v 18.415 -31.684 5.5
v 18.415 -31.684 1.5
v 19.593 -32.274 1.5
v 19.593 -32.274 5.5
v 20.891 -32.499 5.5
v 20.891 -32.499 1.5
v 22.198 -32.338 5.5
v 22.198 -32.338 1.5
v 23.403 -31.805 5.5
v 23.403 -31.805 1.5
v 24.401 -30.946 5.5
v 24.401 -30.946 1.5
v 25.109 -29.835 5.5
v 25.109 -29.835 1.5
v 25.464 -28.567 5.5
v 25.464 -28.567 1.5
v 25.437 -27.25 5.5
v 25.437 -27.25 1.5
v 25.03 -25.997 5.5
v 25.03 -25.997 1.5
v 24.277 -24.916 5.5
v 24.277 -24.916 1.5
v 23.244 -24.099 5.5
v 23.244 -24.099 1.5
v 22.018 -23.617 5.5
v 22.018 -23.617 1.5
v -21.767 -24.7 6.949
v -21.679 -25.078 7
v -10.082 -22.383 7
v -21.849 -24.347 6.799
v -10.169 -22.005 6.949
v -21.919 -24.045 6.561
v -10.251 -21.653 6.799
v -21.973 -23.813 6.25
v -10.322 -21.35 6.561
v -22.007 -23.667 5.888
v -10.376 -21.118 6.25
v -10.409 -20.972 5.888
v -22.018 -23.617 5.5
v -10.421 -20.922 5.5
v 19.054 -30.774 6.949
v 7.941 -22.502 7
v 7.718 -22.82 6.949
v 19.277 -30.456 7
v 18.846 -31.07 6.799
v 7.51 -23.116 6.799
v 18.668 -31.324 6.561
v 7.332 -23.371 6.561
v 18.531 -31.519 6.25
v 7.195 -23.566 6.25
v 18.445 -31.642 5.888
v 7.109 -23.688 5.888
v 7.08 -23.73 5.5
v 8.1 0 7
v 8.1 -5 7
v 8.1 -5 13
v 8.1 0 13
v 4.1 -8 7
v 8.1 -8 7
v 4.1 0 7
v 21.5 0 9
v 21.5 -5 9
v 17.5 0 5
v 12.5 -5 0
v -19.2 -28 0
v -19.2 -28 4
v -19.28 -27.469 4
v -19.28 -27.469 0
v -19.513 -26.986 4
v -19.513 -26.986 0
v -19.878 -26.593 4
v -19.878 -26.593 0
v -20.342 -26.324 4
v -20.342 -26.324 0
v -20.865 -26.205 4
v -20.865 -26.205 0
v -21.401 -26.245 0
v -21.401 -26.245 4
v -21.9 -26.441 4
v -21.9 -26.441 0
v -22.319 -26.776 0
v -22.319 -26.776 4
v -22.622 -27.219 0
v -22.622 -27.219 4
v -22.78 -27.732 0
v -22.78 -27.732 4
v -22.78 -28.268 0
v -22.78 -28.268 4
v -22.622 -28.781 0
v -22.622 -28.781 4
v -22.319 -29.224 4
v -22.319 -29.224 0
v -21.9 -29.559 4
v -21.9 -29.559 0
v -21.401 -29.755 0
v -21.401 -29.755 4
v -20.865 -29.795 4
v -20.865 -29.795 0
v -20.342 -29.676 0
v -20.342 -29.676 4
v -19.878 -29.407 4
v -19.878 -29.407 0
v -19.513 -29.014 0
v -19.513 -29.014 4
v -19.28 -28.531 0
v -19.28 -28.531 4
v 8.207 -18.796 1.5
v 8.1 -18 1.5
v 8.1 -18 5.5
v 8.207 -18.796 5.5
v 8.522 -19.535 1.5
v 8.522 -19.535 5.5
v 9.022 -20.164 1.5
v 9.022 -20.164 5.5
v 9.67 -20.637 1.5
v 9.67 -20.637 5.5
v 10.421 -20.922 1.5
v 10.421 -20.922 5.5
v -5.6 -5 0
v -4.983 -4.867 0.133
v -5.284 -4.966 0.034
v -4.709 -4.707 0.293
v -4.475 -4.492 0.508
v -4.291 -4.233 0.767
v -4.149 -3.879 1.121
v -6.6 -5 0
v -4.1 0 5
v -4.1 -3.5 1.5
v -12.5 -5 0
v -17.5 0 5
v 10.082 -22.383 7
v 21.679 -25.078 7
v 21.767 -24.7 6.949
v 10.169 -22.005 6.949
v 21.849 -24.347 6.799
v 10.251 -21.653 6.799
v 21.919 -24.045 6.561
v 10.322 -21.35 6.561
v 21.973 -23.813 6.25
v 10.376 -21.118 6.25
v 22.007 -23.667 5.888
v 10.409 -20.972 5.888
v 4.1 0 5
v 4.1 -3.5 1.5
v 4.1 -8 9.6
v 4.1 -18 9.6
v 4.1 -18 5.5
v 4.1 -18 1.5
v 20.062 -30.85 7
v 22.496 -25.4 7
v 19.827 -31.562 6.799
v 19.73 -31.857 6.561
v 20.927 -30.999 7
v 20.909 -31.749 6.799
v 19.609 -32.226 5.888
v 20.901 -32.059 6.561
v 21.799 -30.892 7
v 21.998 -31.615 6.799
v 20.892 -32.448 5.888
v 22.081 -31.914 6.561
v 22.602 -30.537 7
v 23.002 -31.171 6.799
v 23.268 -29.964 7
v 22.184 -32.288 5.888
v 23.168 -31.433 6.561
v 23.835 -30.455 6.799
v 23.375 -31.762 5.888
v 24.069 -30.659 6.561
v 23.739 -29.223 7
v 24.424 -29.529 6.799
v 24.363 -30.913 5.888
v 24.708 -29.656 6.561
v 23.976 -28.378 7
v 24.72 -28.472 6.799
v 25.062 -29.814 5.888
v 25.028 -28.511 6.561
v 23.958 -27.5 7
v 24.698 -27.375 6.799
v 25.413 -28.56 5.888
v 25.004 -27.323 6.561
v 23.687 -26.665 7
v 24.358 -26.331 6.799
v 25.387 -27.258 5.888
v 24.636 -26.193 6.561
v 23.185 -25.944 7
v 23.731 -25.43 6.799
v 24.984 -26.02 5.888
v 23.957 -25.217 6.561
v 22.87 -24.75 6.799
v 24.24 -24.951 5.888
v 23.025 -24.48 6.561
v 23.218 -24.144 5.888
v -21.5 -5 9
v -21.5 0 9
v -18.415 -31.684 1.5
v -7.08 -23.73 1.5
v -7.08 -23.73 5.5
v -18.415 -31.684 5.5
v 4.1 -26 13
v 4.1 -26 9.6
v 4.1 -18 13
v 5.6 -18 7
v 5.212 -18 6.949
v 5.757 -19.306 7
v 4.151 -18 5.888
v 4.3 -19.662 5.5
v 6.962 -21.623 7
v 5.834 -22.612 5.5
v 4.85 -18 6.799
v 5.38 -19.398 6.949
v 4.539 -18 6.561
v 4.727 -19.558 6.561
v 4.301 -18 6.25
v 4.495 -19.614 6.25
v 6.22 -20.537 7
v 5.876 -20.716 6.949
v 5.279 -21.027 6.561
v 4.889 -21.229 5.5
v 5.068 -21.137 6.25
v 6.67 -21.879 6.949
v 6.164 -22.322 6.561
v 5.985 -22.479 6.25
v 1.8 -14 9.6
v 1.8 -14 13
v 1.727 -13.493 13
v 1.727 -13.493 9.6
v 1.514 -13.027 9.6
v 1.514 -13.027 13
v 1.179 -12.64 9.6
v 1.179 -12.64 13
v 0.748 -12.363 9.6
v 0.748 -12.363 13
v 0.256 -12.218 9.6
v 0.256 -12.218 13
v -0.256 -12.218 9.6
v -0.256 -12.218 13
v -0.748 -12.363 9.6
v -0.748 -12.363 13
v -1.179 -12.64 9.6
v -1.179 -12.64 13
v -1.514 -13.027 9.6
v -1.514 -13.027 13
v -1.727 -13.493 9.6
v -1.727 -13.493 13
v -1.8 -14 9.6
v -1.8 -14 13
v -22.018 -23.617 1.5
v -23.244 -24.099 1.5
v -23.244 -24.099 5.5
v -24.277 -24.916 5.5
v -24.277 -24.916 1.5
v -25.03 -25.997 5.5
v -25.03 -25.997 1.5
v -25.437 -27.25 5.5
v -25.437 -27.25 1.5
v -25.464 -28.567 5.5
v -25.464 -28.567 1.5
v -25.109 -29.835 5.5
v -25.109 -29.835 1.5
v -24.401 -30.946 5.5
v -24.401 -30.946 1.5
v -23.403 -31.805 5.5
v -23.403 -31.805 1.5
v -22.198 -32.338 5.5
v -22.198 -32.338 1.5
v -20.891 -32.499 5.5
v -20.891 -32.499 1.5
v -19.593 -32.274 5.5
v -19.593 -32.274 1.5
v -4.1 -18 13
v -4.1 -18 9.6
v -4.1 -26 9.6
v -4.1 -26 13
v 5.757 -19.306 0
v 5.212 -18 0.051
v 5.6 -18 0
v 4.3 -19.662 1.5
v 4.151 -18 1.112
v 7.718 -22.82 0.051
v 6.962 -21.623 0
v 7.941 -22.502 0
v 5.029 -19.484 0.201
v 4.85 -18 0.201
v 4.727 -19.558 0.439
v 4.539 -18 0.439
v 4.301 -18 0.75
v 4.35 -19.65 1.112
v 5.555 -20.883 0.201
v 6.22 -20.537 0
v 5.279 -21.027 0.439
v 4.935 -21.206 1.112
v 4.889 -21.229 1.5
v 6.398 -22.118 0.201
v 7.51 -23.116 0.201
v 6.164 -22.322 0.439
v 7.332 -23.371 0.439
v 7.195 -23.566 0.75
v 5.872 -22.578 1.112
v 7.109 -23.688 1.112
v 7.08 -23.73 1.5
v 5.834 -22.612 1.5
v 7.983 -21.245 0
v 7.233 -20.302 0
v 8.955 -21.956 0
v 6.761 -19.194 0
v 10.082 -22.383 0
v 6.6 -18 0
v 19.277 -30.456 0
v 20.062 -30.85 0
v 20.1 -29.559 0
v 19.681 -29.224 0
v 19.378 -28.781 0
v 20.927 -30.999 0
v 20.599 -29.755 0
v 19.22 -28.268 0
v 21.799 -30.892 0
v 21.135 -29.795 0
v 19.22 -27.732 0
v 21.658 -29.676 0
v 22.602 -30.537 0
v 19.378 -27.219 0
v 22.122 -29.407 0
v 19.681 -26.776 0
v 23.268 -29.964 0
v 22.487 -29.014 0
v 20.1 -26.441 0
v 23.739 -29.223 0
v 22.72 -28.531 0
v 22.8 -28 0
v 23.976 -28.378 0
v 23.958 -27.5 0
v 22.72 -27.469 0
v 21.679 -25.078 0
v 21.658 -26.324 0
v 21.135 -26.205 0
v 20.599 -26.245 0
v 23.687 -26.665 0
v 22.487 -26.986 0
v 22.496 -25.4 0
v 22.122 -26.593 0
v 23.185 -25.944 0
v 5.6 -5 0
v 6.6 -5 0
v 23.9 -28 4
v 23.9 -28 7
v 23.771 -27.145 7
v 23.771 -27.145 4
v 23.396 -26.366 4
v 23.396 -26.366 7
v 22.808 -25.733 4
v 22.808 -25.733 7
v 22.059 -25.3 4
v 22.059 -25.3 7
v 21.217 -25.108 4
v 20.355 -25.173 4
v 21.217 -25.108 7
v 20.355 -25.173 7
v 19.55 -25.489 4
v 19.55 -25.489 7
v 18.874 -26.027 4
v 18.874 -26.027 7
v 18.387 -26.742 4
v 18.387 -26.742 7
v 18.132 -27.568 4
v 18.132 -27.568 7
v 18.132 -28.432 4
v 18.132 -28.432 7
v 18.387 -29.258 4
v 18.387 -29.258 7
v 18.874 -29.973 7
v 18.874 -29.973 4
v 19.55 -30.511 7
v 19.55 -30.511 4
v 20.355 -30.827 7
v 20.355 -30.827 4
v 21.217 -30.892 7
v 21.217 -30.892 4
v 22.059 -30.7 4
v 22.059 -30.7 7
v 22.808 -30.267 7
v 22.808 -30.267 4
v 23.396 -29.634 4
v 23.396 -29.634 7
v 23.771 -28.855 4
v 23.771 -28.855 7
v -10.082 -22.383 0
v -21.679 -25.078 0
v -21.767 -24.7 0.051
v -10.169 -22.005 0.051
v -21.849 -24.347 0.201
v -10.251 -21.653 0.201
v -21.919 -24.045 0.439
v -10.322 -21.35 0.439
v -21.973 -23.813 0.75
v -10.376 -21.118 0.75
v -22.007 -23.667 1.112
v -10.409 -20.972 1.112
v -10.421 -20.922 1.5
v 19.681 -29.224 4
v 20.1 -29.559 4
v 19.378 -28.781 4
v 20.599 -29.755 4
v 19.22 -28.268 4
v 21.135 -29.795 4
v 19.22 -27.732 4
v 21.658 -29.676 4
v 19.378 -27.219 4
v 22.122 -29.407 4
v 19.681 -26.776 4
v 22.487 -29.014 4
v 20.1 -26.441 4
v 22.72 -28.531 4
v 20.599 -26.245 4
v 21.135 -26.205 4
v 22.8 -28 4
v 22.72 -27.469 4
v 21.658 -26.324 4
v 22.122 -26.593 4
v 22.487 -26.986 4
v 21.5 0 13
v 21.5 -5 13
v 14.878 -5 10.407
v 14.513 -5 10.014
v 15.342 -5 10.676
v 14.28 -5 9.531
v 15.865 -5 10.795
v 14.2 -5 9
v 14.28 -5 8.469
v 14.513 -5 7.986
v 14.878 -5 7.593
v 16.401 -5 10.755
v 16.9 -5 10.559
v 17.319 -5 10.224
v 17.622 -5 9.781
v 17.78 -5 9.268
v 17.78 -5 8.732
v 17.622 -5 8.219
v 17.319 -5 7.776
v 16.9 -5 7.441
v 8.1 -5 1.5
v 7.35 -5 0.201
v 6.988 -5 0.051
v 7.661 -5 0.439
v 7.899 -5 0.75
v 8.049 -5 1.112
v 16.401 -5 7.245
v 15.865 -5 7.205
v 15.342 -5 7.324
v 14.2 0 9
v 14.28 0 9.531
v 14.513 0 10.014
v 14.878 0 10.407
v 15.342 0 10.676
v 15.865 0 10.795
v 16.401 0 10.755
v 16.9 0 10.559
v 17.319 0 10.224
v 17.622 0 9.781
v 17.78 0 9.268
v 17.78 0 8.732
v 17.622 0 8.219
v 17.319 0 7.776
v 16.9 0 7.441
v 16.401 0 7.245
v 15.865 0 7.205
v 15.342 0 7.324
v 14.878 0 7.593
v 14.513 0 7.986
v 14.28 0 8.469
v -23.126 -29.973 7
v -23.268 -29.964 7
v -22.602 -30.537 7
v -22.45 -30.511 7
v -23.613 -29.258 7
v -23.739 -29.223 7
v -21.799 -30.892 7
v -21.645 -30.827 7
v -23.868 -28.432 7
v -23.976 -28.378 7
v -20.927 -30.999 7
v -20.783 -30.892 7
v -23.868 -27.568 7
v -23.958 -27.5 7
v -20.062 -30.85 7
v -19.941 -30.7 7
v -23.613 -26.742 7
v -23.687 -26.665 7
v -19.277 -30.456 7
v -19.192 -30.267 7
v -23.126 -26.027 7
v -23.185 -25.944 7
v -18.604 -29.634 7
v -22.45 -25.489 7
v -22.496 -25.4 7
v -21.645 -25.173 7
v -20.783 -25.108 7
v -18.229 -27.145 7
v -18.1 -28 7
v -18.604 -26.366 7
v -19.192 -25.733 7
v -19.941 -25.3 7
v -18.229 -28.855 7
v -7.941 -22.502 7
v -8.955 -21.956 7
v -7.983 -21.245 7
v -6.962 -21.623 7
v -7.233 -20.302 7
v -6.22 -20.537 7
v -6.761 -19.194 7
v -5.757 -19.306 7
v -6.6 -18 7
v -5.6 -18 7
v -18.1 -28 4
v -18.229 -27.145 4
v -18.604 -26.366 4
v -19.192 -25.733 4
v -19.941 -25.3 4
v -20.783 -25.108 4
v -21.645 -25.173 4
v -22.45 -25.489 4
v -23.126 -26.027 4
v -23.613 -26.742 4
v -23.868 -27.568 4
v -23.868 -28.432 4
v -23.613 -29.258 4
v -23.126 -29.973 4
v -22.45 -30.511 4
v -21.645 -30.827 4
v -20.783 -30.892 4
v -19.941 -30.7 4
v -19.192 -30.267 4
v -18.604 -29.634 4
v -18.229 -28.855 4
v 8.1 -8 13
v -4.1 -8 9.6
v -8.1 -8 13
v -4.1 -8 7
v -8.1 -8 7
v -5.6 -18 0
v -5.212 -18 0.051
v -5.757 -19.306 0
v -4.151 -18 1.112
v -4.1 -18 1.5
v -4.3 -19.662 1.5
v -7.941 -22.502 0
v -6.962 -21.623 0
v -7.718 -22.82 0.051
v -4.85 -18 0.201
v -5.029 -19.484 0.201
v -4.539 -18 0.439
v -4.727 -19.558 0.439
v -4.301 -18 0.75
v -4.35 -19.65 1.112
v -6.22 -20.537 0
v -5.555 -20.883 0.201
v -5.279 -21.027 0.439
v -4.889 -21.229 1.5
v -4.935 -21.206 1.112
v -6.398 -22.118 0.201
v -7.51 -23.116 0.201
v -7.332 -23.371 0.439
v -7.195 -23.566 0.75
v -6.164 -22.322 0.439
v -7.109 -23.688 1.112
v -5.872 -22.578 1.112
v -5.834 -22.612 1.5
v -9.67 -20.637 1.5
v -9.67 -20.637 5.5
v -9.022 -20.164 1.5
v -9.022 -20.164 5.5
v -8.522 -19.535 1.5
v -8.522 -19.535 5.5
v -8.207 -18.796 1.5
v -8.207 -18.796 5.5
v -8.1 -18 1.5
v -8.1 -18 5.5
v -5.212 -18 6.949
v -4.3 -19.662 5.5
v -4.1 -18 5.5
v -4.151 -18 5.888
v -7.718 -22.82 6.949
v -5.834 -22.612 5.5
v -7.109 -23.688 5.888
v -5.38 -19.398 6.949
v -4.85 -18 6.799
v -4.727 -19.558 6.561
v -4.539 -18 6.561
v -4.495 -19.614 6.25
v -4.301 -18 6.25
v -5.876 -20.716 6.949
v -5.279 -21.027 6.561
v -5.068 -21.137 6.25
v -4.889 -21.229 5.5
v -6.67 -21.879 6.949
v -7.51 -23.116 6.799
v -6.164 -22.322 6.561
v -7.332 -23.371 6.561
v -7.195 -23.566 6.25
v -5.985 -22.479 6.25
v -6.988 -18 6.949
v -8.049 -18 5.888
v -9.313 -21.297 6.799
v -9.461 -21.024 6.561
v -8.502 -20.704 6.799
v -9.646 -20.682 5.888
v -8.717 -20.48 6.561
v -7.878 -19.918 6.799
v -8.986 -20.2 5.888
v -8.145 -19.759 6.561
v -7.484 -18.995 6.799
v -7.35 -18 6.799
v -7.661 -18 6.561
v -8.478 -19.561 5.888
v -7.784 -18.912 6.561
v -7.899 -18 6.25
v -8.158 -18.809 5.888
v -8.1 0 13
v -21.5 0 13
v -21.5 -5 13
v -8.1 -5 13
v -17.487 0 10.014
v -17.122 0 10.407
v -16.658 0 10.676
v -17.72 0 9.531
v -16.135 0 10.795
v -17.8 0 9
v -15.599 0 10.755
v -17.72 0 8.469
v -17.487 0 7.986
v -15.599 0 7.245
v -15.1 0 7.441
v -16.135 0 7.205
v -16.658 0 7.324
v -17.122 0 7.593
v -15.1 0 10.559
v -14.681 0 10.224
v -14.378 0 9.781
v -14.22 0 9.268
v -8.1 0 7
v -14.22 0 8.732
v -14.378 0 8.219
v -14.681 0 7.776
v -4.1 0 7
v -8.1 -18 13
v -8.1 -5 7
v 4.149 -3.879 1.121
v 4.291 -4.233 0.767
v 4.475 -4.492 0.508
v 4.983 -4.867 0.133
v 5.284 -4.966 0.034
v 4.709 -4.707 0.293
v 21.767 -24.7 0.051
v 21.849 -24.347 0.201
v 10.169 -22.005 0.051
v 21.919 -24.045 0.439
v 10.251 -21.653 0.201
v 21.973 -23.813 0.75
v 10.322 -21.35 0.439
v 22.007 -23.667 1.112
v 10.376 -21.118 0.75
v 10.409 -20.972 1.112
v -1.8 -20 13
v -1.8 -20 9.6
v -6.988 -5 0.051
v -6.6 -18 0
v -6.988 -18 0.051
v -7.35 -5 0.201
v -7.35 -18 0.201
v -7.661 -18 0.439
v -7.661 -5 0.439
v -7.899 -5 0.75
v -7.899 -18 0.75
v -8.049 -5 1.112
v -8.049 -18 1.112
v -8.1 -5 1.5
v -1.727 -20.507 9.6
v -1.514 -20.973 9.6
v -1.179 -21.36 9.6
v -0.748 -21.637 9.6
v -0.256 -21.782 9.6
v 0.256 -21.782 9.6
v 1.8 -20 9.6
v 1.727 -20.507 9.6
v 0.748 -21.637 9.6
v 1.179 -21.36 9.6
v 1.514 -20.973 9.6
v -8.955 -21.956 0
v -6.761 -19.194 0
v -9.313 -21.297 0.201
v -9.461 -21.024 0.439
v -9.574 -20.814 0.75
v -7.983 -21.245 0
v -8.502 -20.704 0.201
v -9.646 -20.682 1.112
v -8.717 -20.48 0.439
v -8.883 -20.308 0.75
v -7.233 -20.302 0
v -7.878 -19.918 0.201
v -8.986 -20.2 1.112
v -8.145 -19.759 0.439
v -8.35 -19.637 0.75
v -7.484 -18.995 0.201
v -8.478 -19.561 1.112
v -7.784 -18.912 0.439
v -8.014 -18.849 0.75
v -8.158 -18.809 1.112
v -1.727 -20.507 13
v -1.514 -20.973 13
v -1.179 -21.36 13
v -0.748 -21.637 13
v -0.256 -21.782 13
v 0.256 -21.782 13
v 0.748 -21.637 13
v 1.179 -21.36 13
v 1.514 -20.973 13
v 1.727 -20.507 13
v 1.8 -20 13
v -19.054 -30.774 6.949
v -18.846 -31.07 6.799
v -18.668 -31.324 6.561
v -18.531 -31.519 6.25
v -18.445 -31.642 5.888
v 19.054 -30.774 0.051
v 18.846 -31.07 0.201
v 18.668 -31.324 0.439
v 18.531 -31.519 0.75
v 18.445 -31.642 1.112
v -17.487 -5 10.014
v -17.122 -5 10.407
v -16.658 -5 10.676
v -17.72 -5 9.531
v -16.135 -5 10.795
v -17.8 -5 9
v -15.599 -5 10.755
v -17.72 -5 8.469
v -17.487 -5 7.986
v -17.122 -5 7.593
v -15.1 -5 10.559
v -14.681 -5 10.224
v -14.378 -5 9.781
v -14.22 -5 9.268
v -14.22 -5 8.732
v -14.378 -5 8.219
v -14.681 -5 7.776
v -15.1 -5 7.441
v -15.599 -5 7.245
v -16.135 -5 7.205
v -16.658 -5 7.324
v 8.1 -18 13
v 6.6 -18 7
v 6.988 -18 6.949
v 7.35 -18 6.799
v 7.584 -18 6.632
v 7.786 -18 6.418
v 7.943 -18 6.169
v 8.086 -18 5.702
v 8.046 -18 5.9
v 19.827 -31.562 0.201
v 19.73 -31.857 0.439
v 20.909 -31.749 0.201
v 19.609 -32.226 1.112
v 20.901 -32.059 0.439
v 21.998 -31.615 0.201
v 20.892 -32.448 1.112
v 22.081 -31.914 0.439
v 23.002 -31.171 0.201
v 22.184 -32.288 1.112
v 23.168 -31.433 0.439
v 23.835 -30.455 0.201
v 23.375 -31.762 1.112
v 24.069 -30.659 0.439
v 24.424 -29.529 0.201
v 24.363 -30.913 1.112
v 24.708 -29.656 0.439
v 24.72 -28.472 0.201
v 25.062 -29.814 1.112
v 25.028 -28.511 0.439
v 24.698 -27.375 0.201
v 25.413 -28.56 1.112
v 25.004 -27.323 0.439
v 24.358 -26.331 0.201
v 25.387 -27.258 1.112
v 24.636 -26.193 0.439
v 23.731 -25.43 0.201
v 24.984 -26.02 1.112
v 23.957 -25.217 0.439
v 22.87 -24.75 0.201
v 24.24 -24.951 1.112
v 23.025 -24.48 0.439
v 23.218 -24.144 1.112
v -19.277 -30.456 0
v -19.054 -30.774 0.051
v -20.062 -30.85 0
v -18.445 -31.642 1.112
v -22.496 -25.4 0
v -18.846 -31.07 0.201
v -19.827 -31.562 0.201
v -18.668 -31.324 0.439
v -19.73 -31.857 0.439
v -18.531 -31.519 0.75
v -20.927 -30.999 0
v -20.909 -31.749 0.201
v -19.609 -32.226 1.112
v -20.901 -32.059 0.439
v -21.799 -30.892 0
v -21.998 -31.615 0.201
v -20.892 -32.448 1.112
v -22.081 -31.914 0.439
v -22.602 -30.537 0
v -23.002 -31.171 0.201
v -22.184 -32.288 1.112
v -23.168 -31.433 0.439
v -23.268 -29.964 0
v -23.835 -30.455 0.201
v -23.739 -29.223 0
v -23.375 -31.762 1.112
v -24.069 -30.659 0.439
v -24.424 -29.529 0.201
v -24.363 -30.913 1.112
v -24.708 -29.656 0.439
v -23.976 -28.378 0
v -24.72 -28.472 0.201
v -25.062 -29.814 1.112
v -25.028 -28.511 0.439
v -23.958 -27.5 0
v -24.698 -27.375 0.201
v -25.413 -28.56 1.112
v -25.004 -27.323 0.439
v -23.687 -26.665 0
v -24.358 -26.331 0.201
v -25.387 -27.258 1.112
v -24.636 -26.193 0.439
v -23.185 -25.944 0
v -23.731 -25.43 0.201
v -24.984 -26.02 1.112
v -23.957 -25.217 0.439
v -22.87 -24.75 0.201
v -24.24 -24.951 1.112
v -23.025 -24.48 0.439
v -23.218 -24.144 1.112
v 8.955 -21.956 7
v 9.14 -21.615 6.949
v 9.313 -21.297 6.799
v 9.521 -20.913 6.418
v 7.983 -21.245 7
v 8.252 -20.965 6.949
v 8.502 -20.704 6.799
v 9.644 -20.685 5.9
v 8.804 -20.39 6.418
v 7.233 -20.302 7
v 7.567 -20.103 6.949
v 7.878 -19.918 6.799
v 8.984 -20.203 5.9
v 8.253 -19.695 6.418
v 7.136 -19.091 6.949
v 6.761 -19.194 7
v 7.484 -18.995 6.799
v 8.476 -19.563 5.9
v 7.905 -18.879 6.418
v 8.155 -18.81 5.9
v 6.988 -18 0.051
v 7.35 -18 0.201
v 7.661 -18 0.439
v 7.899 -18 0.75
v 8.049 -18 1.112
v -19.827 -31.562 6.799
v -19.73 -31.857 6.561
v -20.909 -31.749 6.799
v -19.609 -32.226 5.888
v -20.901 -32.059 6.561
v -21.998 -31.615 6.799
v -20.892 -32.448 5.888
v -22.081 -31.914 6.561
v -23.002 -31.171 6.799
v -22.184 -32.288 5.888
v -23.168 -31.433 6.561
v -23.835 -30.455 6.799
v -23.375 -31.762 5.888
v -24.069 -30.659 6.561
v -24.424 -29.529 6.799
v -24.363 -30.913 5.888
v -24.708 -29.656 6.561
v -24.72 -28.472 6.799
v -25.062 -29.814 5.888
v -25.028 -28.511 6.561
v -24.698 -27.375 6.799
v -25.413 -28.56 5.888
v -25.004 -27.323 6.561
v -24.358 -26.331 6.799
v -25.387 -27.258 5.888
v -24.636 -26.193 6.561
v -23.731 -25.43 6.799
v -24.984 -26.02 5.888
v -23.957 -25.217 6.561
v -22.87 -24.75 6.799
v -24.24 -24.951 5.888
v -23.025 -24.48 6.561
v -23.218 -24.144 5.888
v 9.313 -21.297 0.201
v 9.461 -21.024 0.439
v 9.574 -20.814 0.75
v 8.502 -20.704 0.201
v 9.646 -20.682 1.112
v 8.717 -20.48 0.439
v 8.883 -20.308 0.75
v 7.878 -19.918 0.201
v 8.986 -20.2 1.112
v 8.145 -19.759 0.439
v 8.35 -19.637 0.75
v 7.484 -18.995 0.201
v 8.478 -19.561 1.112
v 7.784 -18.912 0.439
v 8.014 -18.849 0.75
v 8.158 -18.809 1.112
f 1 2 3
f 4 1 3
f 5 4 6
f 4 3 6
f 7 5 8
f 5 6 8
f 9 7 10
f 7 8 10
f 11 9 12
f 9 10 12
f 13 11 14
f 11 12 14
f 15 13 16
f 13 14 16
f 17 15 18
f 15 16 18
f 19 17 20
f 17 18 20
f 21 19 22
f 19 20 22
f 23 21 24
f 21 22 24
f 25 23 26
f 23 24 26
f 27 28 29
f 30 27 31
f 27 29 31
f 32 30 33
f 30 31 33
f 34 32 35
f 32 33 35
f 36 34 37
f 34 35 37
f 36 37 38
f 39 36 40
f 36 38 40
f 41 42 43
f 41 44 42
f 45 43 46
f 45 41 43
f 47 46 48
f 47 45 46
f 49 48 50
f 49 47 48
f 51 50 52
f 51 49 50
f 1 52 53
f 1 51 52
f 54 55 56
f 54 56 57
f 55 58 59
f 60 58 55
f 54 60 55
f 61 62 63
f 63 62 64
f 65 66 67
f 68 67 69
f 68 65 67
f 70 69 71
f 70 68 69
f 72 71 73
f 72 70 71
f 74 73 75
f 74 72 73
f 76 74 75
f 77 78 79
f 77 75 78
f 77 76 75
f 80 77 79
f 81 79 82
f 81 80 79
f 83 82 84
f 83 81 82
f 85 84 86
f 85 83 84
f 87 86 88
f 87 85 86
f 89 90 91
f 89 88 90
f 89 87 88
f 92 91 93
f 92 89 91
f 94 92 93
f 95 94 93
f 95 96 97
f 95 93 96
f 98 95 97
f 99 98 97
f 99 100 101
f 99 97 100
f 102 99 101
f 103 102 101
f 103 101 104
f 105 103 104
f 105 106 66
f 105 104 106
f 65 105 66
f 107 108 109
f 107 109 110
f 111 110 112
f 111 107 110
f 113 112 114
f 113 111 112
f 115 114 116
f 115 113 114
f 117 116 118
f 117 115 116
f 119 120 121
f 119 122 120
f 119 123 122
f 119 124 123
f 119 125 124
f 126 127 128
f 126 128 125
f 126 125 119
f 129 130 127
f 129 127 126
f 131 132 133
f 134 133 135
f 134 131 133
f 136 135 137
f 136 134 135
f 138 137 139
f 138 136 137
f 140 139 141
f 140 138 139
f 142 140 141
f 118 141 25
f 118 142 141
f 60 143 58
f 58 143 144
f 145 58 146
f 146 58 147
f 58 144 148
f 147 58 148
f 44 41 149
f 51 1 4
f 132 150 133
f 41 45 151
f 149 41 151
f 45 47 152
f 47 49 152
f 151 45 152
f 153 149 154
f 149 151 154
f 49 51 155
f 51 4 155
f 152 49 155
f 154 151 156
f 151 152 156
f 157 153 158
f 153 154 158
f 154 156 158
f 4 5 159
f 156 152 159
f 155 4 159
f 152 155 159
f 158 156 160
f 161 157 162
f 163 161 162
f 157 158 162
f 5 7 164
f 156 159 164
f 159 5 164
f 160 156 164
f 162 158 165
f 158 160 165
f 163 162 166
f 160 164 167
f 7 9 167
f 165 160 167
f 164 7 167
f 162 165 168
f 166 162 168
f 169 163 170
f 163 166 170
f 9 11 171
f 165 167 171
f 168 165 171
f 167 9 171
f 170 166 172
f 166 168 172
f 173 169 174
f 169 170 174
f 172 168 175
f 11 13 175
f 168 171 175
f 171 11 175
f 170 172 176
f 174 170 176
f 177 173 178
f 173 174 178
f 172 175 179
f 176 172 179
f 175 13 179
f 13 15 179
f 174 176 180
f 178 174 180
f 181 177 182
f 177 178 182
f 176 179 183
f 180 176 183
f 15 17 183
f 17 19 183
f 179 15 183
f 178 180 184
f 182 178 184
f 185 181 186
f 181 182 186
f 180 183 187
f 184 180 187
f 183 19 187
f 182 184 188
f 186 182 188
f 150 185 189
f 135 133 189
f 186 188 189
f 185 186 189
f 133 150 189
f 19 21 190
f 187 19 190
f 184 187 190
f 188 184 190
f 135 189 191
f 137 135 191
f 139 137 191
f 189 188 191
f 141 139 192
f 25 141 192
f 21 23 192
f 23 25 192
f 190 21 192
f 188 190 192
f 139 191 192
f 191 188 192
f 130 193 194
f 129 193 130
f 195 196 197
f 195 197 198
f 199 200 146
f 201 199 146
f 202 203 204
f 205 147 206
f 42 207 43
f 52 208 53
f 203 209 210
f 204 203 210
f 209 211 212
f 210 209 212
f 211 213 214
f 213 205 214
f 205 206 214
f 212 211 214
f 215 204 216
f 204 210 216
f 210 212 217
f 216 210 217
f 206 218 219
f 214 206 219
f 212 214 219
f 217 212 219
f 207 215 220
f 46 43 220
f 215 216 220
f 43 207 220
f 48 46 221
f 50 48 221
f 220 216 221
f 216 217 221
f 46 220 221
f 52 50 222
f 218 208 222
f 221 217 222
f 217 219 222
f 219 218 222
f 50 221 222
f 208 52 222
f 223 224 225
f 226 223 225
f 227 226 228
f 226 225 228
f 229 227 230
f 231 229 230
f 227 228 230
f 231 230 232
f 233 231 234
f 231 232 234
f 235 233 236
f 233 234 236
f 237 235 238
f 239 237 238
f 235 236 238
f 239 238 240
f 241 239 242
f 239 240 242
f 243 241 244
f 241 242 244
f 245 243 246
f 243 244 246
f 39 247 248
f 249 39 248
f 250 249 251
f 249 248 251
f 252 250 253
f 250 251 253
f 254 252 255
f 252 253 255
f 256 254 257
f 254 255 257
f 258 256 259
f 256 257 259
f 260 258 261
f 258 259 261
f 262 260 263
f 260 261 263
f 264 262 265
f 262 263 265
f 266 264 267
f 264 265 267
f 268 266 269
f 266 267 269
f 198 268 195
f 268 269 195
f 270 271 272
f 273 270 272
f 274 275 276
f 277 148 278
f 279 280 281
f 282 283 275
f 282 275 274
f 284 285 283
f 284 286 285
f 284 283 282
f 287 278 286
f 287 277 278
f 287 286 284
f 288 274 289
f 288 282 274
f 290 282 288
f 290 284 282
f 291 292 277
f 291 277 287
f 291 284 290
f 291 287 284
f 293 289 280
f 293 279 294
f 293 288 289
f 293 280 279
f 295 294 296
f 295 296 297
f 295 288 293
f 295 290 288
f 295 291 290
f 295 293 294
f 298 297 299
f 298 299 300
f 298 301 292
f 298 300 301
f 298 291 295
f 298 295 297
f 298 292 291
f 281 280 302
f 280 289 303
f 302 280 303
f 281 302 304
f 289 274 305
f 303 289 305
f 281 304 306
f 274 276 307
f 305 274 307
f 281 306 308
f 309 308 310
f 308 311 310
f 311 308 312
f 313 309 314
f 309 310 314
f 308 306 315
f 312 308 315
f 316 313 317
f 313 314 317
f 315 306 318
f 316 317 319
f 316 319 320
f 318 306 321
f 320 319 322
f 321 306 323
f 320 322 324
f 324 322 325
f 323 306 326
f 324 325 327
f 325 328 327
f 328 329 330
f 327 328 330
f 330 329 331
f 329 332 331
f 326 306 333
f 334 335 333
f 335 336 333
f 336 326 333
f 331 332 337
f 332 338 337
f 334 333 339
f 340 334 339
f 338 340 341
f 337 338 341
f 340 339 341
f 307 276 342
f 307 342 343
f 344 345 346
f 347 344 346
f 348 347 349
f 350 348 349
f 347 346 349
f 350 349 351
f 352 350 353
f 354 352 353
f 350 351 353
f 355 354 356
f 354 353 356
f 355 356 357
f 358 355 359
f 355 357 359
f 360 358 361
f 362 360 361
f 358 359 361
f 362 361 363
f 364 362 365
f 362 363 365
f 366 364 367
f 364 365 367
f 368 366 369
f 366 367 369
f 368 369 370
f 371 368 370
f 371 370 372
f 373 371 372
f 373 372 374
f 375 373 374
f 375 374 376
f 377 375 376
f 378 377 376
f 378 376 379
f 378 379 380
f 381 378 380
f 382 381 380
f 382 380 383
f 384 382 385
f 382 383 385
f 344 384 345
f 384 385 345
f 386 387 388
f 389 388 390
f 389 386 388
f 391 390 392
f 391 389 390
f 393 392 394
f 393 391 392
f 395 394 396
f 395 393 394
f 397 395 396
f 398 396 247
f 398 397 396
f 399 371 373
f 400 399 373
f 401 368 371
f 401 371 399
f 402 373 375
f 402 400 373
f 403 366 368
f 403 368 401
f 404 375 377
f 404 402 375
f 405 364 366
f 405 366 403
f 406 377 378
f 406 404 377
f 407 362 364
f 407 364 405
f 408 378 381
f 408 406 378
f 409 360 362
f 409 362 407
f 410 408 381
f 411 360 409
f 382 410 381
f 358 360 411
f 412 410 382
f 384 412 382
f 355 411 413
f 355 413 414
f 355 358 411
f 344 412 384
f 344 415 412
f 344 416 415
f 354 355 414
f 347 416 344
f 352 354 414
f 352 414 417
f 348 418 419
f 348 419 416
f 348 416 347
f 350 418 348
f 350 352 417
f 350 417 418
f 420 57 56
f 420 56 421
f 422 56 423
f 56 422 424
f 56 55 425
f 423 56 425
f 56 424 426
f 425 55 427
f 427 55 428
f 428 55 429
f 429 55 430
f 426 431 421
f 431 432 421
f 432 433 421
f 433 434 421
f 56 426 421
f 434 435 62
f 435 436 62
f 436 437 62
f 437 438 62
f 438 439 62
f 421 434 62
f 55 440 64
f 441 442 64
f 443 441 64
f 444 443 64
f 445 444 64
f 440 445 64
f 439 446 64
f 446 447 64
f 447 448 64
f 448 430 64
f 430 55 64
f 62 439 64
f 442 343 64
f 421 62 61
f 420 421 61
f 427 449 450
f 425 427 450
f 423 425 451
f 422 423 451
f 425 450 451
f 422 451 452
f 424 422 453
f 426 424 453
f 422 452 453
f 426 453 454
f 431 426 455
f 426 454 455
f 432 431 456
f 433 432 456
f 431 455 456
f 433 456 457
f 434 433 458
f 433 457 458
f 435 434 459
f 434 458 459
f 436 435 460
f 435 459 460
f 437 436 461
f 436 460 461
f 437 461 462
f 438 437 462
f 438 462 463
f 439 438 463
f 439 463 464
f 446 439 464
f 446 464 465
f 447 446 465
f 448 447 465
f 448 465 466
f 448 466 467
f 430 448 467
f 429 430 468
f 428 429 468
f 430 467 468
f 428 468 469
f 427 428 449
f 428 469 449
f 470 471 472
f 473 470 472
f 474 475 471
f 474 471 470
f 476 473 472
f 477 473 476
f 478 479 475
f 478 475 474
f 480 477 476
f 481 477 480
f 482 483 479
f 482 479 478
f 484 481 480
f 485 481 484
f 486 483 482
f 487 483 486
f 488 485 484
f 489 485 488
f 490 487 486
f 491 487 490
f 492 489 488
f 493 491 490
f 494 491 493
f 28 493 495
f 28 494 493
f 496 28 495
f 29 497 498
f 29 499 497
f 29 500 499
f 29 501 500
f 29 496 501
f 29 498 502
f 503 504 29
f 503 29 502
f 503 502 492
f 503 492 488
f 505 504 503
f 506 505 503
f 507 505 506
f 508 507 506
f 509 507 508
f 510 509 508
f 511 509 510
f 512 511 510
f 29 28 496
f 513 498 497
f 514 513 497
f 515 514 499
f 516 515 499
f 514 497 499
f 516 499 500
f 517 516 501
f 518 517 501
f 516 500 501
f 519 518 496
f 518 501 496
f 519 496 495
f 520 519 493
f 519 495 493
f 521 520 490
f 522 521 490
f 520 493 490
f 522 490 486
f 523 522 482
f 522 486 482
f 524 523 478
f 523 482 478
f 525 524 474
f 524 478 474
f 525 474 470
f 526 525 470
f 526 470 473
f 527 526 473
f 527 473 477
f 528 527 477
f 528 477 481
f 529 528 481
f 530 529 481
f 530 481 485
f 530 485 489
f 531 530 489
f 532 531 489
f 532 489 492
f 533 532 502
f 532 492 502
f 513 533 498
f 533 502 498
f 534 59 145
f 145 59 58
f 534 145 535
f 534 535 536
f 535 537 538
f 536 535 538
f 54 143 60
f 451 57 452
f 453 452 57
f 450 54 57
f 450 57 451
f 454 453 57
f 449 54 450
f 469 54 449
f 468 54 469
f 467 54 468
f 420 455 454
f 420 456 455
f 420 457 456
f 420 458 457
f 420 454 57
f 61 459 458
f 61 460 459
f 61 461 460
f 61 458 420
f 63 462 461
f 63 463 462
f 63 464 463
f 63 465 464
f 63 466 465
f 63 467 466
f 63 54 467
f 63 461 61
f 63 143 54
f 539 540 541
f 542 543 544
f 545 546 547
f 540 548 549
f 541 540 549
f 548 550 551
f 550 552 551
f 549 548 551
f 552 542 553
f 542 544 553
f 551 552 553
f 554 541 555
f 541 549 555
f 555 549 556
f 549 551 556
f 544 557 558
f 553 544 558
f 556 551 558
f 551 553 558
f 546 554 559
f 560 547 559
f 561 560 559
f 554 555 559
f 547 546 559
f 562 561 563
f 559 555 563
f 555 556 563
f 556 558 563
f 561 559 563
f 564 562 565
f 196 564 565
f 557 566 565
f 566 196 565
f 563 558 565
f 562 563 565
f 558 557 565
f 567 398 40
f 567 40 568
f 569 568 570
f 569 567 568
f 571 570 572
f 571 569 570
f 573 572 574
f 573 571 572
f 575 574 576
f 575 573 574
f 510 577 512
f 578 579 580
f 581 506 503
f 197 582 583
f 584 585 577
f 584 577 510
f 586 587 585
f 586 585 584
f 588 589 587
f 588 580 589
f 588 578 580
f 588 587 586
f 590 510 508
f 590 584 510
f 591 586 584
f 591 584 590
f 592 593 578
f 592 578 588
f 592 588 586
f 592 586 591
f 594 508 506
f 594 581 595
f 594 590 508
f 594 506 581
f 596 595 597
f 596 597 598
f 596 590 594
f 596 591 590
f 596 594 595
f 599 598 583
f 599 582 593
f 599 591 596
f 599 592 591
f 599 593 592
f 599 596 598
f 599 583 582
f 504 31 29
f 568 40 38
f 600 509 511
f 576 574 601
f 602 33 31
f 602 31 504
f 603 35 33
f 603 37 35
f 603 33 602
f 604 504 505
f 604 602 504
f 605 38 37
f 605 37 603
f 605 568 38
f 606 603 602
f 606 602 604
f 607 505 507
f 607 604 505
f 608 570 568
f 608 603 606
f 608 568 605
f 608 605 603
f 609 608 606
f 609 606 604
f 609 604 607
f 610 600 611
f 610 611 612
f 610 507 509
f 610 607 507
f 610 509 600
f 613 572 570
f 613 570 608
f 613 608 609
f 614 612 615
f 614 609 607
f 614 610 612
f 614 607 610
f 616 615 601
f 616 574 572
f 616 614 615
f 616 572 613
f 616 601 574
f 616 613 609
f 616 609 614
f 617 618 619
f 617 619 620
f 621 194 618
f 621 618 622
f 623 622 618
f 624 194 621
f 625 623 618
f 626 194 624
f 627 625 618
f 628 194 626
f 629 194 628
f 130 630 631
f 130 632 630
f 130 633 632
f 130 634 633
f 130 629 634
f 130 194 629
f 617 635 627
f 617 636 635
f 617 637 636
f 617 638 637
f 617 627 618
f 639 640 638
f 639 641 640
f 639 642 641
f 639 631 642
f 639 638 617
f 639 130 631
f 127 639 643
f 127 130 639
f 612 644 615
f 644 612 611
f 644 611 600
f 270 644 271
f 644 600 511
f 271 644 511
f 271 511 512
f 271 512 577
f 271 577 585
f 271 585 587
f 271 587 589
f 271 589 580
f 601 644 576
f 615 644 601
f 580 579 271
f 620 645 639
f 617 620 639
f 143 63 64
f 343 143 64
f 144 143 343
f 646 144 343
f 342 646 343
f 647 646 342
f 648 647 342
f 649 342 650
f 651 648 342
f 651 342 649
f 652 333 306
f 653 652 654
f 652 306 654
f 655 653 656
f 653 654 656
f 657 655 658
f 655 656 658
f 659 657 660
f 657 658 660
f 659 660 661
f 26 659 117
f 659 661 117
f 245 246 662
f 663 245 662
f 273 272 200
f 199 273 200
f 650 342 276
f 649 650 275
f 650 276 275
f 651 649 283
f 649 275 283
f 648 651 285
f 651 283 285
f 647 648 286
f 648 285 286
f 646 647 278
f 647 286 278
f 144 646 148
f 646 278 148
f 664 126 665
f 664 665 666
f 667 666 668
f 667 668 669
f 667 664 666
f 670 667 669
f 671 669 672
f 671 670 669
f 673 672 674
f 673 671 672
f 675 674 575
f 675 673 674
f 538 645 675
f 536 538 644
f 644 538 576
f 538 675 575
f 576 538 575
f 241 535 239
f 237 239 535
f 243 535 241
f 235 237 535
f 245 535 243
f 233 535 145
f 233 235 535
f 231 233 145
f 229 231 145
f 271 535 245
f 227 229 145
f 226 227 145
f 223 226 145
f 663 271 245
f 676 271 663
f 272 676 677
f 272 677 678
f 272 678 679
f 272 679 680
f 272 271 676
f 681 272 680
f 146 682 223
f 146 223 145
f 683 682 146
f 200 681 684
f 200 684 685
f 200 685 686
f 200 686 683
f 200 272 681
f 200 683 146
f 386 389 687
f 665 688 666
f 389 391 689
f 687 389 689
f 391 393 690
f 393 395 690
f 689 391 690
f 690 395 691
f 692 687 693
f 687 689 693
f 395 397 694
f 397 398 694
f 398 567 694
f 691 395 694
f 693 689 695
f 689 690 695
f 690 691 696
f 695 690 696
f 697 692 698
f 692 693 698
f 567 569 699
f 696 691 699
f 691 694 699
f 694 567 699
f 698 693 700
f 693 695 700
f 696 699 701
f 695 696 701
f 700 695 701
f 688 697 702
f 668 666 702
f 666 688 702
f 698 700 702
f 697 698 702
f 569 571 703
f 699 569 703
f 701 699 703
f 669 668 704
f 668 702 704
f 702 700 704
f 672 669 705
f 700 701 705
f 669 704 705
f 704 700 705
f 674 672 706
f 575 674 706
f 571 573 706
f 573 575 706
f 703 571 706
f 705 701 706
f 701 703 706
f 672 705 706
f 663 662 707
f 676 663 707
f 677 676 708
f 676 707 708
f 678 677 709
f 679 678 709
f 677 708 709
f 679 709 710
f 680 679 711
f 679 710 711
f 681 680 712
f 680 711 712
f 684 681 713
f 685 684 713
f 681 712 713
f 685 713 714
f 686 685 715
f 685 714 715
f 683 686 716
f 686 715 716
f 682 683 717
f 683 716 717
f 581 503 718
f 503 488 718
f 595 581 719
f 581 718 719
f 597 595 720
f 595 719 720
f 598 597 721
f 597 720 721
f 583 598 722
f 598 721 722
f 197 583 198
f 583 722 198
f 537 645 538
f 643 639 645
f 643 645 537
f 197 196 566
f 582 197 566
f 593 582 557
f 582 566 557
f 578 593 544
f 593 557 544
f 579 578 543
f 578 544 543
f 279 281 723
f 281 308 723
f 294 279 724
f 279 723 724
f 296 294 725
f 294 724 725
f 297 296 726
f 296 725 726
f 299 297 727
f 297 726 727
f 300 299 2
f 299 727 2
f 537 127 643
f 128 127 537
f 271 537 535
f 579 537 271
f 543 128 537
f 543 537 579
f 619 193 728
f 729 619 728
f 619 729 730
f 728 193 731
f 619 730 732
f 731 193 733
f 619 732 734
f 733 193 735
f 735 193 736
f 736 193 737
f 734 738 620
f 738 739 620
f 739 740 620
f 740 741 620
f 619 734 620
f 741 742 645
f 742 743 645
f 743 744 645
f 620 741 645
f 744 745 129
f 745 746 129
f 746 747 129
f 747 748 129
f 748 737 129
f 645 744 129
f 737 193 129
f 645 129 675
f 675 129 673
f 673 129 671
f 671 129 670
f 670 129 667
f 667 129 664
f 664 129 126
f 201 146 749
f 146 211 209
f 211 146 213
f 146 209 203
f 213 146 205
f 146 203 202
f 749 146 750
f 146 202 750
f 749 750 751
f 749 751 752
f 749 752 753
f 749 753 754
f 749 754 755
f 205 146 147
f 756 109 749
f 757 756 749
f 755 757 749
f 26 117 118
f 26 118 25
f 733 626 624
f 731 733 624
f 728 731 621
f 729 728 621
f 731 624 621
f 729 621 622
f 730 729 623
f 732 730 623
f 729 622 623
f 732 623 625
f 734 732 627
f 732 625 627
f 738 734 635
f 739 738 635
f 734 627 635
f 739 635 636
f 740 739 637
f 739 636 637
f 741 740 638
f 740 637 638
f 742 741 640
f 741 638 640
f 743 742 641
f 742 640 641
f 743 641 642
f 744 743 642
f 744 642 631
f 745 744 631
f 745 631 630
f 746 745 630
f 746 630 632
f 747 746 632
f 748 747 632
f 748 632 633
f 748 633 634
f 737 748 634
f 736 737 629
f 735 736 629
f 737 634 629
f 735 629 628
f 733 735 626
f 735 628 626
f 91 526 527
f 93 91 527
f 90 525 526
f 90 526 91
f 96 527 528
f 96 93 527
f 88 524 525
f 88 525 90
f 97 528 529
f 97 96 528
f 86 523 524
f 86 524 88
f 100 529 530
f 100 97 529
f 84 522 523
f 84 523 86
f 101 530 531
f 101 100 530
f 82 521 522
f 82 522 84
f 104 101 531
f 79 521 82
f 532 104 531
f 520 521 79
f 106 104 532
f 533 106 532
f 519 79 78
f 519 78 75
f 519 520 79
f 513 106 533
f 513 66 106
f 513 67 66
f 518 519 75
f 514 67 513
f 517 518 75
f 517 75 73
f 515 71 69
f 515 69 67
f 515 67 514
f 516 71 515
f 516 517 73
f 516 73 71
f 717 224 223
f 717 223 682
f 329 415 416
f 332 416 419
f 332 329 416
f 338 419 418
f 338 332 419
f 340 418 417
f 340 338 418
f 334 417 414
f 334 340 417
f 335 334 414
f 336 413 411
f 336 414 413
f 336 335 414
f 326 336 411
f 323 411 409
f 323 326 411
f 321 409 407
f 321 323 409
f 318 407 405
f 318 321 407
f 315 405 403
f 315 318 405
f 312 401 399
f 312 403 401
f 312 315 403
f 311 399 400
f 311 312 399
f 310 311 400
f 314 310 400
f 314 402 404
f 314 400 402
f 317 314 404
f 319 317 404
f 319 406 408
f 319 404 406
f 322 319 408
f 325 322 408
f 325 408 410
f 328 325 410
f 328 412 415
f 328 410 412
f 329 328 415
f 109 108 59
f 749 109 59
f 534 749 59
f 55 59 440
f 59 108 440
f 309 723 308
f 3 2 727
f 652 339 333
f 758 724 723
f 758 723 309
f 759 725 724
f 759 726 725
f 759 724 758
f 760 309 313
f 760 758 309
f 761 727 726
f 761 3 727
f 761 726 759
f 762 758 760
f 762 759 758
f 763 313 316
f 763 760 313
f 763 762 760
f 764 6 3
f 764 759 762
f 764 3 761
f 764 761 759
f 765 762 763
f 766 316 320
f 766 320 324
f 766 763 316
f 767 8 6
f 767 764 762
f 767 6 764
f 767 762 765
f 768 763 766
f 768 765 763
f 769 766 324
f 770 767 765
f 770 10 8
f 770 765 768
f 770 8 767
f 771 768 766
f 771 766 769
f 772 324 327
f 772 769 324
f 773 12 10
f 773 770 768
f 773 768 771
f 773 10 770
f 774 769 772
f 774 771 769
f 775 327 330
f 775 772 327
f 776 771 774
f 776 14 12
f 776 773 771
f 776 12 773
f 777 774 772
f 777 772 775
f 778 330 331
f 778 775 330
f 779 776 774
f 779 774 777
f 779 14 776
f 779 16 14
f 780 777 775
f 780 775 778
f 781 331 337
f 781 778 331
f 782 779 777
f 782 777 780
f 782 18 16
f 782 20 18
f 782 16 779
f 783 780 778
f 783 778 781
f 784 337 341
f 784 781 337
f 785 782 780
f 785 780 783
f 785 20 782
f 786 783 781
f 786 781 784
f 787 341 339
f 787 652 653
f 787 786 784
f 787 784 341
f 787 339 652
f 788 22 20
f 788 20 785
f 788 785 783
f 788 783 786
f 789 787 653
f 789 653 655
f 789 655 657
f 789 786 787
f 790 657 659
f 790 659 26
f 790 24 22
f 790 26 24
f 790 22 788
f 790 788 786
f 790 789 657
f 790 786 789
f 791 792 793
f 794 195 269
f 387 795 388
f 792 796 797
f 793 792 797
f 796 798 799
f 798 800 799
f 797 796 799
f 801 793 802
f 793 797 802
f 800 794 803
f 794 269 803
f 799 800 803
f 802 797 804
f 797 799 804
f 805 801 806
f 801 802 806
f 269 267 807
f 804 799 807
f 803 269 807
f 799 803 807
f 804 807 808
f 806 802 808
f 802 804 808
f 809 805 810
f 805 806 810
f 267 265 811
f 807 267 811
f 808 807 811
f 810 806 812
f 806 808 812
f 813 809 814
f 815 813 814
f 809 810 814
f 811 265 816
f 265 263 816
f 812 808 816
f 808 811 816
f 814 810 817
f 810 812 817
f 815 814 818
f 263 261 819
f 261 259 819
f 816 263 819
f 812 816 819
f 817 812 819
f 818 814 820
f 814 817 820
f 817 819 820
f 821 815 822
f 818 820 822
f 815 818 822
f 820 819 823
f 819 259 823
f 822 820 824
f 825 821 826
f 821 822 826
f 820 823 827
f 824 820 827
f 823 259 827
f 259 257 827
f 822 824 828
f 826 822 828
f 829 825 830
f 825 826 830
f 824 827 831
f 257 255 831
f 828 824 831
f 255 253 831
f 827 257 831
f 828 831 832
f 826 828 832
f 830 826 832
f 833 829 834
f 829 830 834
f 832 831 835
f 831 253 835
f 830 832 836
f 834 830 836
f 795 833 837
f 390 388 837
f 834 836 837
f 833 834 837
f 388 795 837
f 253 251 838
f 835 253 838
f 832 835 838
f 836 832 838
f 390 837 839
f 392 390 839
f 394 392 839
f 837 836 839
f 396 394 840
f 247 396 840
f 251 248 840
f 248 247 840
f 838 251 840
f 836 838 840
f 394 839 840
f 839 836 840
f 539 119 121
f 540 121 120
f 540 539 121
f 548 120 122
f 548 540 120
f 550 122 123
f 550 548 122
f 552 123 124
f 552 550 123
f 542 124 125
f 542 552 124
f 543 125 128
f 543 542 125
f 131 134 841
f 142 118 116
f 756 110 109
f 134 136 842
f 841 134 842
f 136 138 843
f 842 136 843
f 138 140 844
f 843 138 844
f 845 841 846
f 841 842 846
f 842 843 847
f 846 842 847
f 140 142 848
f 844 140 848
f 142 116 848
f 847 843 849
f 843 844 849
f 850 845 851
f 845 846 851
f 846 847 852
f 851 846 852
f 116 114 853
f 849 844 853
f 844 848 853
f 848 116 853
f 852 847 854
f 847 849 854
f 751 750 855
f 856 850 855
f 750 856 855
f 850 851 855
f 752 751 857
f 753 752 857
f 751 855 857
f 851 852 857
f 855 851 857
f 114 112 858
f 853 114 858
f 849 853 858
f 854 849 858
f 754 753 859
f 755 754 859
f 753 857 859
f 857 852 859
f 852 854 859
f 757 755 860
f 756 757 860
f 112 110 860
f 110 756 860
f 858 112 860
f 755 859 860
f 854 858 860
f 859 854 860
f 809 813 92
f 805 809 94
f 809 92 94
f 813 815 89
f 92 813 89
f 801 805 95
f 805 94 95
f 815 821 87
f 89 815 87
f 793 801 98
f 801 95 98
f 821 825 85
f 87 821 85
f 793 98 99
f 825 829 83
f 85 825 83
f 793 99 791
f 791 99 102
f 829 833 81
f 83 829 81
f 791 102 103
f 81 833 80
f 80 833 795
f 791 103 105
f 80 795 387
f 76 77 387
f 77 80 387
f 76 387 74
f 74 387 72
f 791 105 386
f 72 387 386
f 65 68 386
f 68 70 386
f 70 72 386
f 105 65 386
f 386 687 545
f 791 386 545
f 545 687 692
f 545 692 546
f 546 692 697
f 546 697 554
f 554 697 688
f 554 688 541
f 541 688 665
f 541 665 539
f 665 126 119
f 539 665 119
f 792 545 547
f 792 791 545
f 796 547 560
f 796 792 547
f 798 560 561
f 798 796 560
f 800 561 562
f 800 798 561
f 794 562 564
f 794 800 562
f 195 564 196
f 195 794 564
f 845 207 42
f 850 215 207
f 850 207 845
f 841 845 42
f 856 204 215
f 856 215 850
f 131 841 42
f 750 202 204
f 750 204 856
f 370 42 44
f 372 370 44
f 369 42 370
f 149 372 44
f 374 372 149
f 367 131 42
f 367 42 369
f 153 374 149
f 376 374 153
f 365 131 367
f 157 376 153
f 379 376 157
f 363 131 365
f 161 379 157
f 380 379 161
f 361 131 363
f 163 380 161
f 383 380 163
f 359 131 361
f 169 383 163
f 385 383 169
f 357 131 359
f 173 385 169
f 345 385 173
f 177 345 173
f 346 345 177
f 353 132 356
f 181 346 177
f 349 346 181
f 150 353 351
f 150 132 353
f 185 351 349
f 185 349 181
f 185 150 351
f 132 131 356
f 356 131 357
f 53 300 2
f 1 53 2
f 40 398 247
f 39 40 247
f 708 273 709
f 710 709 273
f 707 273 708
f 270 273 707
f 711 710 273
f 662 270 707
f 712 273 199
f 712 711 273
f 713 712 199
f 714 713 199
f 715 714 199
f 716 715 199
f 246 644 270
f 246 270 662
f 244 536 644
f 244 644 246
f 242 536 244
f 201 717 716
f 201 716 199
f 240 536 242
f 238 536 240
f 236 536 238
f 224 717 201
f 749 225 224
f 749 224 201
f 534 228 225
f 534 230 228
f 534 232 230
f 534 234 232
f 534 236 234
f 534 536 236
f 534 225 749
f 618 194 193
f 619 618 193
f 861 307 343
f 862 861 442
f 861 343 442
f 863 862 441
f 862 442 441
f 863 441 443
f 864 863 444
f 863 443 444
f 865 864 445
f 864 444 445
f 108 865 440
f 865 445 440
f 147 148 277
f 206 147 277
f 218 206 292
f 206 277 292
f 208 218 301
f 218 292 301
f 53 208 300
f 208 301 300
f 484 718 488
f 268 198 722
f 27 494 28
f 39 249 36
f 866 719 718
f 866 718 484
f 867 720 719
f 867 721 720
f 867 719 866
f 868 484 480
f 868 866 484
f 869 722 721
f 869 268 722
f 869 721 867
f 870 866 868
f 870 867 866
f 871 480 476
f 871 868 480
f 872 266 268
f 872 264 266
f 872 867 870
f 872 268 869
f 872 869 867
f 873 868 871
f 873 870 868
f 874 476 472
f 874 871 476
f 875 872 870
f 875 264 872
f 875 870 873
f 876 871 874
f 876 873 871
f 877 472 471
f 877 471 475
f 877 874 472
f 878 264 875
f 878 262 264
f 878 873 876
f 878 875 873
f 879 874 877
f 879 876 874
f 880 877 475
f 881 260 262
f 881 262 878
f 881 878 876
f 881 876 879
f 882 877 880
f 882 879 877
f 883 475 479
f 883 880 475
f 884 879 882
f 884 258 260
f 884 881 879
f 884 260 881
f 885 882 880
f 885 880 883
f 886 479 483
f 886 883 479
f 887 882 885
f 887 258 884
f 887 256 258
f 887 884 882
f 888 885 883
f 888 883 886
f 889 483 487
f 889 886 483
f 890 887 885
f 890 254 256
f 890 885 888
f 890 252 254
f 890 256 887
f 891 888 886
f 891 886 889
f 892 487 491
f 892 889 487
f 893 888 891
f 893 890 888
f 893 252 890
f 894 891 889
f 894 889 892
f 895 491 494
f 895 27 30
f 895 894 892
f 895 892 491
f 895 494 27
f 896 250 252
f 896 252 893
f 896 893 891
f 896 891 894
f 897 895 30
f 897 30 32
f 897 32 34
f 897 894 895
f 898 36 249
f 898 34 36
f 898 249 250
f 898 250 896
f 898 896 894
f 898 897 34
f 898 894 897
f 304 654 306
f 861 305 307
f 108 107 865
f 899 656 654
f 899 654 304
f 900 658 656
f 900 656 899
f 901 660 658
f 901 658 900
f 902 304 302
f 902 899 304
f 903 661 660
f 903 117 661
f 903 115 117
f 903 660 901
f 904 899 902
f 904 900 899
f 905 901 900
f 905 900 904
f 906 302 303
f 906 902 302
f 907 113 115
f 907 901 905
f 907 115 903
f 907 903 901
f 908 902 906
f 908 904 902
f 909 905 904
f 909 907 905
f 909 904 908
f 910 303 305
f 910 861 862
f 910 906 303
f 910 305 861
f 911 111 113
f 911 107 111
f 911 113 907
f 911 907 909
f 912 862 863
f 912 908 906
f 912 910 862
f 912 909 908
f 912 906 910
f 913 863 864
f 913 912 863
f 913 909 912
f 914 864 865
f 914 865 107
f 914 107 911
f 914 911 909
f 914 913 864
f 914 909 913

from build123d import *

# Parameters (mm, degrees)
SKETCH_R        = 1.8
PAD_DEPTH       = 7
SKETCH001_R     = 2.9
POCKET_DEPTH    = 3
SKETCH002_W     = 13.4
SKETCH002_H     = 5
PAD001_DEPTH    = 6
SKETCH005_R     = 1.8
POCKET002_DEPTH = 5
PAD002_DEPTH    = 6
SKETCH009_W     = 8.2
SKETCH009_H     = 18
POCKET006_DEPTH = 9.6
POCKET003_DEPTH = 47.001
POCKET004_DEPTH = 5
POCKET005_DEPTH = 13.001
FILLET_R        = 1.5


with BuildPart() as part:
    # Sketch → Pad (new body)
    with BuildSketch(Plane.XY):
        with BuildLine():
            Line((-21.5, 0), (-21.5, -5))
            Line((-21.5, -5), (-8.1, -5))
            Line((-8.1, -5), (-8.1, -18))
            ThreePointArc((-10.421049, -20.922161), (-8.750867, -19.865898), (-8.1, -18))
            Line((-10.421049, -20.922161), (-22.018426, -23.616758))
            ThreePointArc((-22.018426, -23.616758), (-25.108802, -29.835142), (-18.415416, -31.683738))
            Line((-7.079536, -23.730259), (-18.415416, -31.683738))
            ThreePointArc((-7.079536, -23.730259), (-4.889394, -21.2293), (-4.1, -18))
            Line((-4.1, -18), (-4.1, -26))
            Line((-4.1, -26), (4.1, -26))
            Line((4.1, -18), (4.1, -26))
            ThreePointArc((4.1, -18), (4.889394, -21.2293), (7.079536, -23.730259))
            Line((7.079536, -23.730259), (18.415416, -31.683738))
            ThreePointArc((18.415416, -31.683738), (25.108802, -29.835142), (22.018426, -23.616758))
            Line((10.421049, -20.922161), (22.018426, -23.616758))
            ThreePointArc((8.1, -18), (8.750867, -19.865898), (10.421049, -20.922161))
            Line((8.1, -5), (8.1, -18))
            Line((21.5, -5), (8.1, -5))
            Line((21.5, -5), (21.5, 0))
            Line((21.5, 0), (4.1, 0))
            Line((4.1, 0), (4.1, -8))
            Line((-4.1, -8), (4.1, -8))
            Line((-4.1, 0), (-4.1, -8))
            Line((-21.5, 0), (-4.1, 0))
        make_face()
        with Locations((-21, -28)):
            Circle(SKETCH_R, mode=Mode.SUBTRACT)
        with Locations((21, -28)):
            Circle(SKETCH_R, mode=Mode.SUBTRACT)
    extrude(amount=PAD_DEPTH)

    # Sketch001 (on Face28 of Pad) → Pocket (cut)
    with BuildSketch(Plane.XY.offset(7)):
        with Locations((-21, -28)):
            Circle(SKETCH001_R)
        with Locations((21, -28)):
            Circle(SKETCH001_R)
    extrude(amount=-POCKET_DEPTH, mode=Mode.SUBTRACT)

    # Sketch002 (on Face5 of Pocket) → Pad001 (join)
    with BuildSketch(Plane.XY.offset(7)):
        with Locations((14.8, -2.5)):
            Rectangle(SKETCH002_W, SKETCH002_H)
        with Locations((-14.8, -2.5)):
            Rectangle(SKETCH002_W, SKETCH002_H)
    extrude(amount=PAD001_DEPTH)

    # Sketch005 (on Face32 of Pad001) → Pocket002 (cut)
    with BuildSketch(Plane(origin=(0, 0, 0), x_dir=(-1, 0, 0), z_dir=(0, 1, 0))):
        with Locations((-16, 9)):
            Circle(SKETCH005_R)
        with Locations((16, 9)):
            Circle(SKETCH005_R)
    extrude(amount=-POCKET002_DEPTH, mode=Mode.SUBTRACT)

    # Sketch003 (on Face3 of Pad001) → Pad002 (join)
    with BuildSketch(Plane.XY.offset(7)):
        Polygon((-8.1, -8), (-8.1, -18), (-4.1, -18), (-4.1, -26), (4.1, -26), (4.1, -18), (8.1, -18), (8.1, -8), align=None)
    extrude(amount=PAD002_DEPTH)

    # Sketch009 (on Face1 of Pad002) → Pocket006 (cut)
    with BuildSketch(Plane(origin=(0, 0, 0), x_dir=(1, 0, 0), z_dir=(0, 0, -1))):
        with Locations((0, 17)):
            Rectangle(SKETCH009_W, SKETCH009_H)
    extrude(amount=-POCKET006_DEPTH, mode=Mode.SUBTRACT)

    # Sketch006 → Pocket003 (cut, through all)
    with BuildSketch(Plane(origin=(-21.5, 0, 0), x_dir=(0, -1, 0), z_dir=(-1, 0, 0))):
        Polygon((5, 0), (0, 0), (0, 5), align=None)
    extrude(amount=-POCKET003_DEPTH, mode=Mode.SUBTRACT)

    # Sketch007 (on Face37 of Pocket003) → Pocket004 (cut)
    with BuildSketch(Plane.XZ.offset(5)):
        Polygon((-21.5, 0), (-21.5, 9), (-12.5, 0), align=None)
        Polygon((21.5, 0), (21.5, 9), (12.5, 0), align=None)
    extrude(amount=-POCKET004_DEPTH, mode=Mode.SUBTRACT)

    # Sketch008 (on Face18 of Pocket004) → Pocket005 (cut, through all)
    with BuildSketch(Plane.XY.offset(13)):
        with BuildLine():
            ThreePointArc((1.8, -14), (0, -12.2), (-1.8, -14))
            Line((-1.8, -14), (-1.8, -20))
            ThreePointArc((-1.8, -20), (0, -21.8), (1.8, -20))
            Line((1.8, -14), (1.8, -20))
        make_face()
    extrude(amount=-POCKET005_DEPTH, mode=Mode.SUBTRACT)

    # Fillet
    fillet_edges = [part.edges().sort_by_distance(p)[0] for p in [
        (12.747476, -27.706999, 0),
        (-12.747476, -27.706999, 0),
        (-12.747476, -27.706999, 7),
        (12.747476, -27.706999, 7),
    ]]
    fillet(fillet_edges, radius=FILLET_R)


solid = part.part
